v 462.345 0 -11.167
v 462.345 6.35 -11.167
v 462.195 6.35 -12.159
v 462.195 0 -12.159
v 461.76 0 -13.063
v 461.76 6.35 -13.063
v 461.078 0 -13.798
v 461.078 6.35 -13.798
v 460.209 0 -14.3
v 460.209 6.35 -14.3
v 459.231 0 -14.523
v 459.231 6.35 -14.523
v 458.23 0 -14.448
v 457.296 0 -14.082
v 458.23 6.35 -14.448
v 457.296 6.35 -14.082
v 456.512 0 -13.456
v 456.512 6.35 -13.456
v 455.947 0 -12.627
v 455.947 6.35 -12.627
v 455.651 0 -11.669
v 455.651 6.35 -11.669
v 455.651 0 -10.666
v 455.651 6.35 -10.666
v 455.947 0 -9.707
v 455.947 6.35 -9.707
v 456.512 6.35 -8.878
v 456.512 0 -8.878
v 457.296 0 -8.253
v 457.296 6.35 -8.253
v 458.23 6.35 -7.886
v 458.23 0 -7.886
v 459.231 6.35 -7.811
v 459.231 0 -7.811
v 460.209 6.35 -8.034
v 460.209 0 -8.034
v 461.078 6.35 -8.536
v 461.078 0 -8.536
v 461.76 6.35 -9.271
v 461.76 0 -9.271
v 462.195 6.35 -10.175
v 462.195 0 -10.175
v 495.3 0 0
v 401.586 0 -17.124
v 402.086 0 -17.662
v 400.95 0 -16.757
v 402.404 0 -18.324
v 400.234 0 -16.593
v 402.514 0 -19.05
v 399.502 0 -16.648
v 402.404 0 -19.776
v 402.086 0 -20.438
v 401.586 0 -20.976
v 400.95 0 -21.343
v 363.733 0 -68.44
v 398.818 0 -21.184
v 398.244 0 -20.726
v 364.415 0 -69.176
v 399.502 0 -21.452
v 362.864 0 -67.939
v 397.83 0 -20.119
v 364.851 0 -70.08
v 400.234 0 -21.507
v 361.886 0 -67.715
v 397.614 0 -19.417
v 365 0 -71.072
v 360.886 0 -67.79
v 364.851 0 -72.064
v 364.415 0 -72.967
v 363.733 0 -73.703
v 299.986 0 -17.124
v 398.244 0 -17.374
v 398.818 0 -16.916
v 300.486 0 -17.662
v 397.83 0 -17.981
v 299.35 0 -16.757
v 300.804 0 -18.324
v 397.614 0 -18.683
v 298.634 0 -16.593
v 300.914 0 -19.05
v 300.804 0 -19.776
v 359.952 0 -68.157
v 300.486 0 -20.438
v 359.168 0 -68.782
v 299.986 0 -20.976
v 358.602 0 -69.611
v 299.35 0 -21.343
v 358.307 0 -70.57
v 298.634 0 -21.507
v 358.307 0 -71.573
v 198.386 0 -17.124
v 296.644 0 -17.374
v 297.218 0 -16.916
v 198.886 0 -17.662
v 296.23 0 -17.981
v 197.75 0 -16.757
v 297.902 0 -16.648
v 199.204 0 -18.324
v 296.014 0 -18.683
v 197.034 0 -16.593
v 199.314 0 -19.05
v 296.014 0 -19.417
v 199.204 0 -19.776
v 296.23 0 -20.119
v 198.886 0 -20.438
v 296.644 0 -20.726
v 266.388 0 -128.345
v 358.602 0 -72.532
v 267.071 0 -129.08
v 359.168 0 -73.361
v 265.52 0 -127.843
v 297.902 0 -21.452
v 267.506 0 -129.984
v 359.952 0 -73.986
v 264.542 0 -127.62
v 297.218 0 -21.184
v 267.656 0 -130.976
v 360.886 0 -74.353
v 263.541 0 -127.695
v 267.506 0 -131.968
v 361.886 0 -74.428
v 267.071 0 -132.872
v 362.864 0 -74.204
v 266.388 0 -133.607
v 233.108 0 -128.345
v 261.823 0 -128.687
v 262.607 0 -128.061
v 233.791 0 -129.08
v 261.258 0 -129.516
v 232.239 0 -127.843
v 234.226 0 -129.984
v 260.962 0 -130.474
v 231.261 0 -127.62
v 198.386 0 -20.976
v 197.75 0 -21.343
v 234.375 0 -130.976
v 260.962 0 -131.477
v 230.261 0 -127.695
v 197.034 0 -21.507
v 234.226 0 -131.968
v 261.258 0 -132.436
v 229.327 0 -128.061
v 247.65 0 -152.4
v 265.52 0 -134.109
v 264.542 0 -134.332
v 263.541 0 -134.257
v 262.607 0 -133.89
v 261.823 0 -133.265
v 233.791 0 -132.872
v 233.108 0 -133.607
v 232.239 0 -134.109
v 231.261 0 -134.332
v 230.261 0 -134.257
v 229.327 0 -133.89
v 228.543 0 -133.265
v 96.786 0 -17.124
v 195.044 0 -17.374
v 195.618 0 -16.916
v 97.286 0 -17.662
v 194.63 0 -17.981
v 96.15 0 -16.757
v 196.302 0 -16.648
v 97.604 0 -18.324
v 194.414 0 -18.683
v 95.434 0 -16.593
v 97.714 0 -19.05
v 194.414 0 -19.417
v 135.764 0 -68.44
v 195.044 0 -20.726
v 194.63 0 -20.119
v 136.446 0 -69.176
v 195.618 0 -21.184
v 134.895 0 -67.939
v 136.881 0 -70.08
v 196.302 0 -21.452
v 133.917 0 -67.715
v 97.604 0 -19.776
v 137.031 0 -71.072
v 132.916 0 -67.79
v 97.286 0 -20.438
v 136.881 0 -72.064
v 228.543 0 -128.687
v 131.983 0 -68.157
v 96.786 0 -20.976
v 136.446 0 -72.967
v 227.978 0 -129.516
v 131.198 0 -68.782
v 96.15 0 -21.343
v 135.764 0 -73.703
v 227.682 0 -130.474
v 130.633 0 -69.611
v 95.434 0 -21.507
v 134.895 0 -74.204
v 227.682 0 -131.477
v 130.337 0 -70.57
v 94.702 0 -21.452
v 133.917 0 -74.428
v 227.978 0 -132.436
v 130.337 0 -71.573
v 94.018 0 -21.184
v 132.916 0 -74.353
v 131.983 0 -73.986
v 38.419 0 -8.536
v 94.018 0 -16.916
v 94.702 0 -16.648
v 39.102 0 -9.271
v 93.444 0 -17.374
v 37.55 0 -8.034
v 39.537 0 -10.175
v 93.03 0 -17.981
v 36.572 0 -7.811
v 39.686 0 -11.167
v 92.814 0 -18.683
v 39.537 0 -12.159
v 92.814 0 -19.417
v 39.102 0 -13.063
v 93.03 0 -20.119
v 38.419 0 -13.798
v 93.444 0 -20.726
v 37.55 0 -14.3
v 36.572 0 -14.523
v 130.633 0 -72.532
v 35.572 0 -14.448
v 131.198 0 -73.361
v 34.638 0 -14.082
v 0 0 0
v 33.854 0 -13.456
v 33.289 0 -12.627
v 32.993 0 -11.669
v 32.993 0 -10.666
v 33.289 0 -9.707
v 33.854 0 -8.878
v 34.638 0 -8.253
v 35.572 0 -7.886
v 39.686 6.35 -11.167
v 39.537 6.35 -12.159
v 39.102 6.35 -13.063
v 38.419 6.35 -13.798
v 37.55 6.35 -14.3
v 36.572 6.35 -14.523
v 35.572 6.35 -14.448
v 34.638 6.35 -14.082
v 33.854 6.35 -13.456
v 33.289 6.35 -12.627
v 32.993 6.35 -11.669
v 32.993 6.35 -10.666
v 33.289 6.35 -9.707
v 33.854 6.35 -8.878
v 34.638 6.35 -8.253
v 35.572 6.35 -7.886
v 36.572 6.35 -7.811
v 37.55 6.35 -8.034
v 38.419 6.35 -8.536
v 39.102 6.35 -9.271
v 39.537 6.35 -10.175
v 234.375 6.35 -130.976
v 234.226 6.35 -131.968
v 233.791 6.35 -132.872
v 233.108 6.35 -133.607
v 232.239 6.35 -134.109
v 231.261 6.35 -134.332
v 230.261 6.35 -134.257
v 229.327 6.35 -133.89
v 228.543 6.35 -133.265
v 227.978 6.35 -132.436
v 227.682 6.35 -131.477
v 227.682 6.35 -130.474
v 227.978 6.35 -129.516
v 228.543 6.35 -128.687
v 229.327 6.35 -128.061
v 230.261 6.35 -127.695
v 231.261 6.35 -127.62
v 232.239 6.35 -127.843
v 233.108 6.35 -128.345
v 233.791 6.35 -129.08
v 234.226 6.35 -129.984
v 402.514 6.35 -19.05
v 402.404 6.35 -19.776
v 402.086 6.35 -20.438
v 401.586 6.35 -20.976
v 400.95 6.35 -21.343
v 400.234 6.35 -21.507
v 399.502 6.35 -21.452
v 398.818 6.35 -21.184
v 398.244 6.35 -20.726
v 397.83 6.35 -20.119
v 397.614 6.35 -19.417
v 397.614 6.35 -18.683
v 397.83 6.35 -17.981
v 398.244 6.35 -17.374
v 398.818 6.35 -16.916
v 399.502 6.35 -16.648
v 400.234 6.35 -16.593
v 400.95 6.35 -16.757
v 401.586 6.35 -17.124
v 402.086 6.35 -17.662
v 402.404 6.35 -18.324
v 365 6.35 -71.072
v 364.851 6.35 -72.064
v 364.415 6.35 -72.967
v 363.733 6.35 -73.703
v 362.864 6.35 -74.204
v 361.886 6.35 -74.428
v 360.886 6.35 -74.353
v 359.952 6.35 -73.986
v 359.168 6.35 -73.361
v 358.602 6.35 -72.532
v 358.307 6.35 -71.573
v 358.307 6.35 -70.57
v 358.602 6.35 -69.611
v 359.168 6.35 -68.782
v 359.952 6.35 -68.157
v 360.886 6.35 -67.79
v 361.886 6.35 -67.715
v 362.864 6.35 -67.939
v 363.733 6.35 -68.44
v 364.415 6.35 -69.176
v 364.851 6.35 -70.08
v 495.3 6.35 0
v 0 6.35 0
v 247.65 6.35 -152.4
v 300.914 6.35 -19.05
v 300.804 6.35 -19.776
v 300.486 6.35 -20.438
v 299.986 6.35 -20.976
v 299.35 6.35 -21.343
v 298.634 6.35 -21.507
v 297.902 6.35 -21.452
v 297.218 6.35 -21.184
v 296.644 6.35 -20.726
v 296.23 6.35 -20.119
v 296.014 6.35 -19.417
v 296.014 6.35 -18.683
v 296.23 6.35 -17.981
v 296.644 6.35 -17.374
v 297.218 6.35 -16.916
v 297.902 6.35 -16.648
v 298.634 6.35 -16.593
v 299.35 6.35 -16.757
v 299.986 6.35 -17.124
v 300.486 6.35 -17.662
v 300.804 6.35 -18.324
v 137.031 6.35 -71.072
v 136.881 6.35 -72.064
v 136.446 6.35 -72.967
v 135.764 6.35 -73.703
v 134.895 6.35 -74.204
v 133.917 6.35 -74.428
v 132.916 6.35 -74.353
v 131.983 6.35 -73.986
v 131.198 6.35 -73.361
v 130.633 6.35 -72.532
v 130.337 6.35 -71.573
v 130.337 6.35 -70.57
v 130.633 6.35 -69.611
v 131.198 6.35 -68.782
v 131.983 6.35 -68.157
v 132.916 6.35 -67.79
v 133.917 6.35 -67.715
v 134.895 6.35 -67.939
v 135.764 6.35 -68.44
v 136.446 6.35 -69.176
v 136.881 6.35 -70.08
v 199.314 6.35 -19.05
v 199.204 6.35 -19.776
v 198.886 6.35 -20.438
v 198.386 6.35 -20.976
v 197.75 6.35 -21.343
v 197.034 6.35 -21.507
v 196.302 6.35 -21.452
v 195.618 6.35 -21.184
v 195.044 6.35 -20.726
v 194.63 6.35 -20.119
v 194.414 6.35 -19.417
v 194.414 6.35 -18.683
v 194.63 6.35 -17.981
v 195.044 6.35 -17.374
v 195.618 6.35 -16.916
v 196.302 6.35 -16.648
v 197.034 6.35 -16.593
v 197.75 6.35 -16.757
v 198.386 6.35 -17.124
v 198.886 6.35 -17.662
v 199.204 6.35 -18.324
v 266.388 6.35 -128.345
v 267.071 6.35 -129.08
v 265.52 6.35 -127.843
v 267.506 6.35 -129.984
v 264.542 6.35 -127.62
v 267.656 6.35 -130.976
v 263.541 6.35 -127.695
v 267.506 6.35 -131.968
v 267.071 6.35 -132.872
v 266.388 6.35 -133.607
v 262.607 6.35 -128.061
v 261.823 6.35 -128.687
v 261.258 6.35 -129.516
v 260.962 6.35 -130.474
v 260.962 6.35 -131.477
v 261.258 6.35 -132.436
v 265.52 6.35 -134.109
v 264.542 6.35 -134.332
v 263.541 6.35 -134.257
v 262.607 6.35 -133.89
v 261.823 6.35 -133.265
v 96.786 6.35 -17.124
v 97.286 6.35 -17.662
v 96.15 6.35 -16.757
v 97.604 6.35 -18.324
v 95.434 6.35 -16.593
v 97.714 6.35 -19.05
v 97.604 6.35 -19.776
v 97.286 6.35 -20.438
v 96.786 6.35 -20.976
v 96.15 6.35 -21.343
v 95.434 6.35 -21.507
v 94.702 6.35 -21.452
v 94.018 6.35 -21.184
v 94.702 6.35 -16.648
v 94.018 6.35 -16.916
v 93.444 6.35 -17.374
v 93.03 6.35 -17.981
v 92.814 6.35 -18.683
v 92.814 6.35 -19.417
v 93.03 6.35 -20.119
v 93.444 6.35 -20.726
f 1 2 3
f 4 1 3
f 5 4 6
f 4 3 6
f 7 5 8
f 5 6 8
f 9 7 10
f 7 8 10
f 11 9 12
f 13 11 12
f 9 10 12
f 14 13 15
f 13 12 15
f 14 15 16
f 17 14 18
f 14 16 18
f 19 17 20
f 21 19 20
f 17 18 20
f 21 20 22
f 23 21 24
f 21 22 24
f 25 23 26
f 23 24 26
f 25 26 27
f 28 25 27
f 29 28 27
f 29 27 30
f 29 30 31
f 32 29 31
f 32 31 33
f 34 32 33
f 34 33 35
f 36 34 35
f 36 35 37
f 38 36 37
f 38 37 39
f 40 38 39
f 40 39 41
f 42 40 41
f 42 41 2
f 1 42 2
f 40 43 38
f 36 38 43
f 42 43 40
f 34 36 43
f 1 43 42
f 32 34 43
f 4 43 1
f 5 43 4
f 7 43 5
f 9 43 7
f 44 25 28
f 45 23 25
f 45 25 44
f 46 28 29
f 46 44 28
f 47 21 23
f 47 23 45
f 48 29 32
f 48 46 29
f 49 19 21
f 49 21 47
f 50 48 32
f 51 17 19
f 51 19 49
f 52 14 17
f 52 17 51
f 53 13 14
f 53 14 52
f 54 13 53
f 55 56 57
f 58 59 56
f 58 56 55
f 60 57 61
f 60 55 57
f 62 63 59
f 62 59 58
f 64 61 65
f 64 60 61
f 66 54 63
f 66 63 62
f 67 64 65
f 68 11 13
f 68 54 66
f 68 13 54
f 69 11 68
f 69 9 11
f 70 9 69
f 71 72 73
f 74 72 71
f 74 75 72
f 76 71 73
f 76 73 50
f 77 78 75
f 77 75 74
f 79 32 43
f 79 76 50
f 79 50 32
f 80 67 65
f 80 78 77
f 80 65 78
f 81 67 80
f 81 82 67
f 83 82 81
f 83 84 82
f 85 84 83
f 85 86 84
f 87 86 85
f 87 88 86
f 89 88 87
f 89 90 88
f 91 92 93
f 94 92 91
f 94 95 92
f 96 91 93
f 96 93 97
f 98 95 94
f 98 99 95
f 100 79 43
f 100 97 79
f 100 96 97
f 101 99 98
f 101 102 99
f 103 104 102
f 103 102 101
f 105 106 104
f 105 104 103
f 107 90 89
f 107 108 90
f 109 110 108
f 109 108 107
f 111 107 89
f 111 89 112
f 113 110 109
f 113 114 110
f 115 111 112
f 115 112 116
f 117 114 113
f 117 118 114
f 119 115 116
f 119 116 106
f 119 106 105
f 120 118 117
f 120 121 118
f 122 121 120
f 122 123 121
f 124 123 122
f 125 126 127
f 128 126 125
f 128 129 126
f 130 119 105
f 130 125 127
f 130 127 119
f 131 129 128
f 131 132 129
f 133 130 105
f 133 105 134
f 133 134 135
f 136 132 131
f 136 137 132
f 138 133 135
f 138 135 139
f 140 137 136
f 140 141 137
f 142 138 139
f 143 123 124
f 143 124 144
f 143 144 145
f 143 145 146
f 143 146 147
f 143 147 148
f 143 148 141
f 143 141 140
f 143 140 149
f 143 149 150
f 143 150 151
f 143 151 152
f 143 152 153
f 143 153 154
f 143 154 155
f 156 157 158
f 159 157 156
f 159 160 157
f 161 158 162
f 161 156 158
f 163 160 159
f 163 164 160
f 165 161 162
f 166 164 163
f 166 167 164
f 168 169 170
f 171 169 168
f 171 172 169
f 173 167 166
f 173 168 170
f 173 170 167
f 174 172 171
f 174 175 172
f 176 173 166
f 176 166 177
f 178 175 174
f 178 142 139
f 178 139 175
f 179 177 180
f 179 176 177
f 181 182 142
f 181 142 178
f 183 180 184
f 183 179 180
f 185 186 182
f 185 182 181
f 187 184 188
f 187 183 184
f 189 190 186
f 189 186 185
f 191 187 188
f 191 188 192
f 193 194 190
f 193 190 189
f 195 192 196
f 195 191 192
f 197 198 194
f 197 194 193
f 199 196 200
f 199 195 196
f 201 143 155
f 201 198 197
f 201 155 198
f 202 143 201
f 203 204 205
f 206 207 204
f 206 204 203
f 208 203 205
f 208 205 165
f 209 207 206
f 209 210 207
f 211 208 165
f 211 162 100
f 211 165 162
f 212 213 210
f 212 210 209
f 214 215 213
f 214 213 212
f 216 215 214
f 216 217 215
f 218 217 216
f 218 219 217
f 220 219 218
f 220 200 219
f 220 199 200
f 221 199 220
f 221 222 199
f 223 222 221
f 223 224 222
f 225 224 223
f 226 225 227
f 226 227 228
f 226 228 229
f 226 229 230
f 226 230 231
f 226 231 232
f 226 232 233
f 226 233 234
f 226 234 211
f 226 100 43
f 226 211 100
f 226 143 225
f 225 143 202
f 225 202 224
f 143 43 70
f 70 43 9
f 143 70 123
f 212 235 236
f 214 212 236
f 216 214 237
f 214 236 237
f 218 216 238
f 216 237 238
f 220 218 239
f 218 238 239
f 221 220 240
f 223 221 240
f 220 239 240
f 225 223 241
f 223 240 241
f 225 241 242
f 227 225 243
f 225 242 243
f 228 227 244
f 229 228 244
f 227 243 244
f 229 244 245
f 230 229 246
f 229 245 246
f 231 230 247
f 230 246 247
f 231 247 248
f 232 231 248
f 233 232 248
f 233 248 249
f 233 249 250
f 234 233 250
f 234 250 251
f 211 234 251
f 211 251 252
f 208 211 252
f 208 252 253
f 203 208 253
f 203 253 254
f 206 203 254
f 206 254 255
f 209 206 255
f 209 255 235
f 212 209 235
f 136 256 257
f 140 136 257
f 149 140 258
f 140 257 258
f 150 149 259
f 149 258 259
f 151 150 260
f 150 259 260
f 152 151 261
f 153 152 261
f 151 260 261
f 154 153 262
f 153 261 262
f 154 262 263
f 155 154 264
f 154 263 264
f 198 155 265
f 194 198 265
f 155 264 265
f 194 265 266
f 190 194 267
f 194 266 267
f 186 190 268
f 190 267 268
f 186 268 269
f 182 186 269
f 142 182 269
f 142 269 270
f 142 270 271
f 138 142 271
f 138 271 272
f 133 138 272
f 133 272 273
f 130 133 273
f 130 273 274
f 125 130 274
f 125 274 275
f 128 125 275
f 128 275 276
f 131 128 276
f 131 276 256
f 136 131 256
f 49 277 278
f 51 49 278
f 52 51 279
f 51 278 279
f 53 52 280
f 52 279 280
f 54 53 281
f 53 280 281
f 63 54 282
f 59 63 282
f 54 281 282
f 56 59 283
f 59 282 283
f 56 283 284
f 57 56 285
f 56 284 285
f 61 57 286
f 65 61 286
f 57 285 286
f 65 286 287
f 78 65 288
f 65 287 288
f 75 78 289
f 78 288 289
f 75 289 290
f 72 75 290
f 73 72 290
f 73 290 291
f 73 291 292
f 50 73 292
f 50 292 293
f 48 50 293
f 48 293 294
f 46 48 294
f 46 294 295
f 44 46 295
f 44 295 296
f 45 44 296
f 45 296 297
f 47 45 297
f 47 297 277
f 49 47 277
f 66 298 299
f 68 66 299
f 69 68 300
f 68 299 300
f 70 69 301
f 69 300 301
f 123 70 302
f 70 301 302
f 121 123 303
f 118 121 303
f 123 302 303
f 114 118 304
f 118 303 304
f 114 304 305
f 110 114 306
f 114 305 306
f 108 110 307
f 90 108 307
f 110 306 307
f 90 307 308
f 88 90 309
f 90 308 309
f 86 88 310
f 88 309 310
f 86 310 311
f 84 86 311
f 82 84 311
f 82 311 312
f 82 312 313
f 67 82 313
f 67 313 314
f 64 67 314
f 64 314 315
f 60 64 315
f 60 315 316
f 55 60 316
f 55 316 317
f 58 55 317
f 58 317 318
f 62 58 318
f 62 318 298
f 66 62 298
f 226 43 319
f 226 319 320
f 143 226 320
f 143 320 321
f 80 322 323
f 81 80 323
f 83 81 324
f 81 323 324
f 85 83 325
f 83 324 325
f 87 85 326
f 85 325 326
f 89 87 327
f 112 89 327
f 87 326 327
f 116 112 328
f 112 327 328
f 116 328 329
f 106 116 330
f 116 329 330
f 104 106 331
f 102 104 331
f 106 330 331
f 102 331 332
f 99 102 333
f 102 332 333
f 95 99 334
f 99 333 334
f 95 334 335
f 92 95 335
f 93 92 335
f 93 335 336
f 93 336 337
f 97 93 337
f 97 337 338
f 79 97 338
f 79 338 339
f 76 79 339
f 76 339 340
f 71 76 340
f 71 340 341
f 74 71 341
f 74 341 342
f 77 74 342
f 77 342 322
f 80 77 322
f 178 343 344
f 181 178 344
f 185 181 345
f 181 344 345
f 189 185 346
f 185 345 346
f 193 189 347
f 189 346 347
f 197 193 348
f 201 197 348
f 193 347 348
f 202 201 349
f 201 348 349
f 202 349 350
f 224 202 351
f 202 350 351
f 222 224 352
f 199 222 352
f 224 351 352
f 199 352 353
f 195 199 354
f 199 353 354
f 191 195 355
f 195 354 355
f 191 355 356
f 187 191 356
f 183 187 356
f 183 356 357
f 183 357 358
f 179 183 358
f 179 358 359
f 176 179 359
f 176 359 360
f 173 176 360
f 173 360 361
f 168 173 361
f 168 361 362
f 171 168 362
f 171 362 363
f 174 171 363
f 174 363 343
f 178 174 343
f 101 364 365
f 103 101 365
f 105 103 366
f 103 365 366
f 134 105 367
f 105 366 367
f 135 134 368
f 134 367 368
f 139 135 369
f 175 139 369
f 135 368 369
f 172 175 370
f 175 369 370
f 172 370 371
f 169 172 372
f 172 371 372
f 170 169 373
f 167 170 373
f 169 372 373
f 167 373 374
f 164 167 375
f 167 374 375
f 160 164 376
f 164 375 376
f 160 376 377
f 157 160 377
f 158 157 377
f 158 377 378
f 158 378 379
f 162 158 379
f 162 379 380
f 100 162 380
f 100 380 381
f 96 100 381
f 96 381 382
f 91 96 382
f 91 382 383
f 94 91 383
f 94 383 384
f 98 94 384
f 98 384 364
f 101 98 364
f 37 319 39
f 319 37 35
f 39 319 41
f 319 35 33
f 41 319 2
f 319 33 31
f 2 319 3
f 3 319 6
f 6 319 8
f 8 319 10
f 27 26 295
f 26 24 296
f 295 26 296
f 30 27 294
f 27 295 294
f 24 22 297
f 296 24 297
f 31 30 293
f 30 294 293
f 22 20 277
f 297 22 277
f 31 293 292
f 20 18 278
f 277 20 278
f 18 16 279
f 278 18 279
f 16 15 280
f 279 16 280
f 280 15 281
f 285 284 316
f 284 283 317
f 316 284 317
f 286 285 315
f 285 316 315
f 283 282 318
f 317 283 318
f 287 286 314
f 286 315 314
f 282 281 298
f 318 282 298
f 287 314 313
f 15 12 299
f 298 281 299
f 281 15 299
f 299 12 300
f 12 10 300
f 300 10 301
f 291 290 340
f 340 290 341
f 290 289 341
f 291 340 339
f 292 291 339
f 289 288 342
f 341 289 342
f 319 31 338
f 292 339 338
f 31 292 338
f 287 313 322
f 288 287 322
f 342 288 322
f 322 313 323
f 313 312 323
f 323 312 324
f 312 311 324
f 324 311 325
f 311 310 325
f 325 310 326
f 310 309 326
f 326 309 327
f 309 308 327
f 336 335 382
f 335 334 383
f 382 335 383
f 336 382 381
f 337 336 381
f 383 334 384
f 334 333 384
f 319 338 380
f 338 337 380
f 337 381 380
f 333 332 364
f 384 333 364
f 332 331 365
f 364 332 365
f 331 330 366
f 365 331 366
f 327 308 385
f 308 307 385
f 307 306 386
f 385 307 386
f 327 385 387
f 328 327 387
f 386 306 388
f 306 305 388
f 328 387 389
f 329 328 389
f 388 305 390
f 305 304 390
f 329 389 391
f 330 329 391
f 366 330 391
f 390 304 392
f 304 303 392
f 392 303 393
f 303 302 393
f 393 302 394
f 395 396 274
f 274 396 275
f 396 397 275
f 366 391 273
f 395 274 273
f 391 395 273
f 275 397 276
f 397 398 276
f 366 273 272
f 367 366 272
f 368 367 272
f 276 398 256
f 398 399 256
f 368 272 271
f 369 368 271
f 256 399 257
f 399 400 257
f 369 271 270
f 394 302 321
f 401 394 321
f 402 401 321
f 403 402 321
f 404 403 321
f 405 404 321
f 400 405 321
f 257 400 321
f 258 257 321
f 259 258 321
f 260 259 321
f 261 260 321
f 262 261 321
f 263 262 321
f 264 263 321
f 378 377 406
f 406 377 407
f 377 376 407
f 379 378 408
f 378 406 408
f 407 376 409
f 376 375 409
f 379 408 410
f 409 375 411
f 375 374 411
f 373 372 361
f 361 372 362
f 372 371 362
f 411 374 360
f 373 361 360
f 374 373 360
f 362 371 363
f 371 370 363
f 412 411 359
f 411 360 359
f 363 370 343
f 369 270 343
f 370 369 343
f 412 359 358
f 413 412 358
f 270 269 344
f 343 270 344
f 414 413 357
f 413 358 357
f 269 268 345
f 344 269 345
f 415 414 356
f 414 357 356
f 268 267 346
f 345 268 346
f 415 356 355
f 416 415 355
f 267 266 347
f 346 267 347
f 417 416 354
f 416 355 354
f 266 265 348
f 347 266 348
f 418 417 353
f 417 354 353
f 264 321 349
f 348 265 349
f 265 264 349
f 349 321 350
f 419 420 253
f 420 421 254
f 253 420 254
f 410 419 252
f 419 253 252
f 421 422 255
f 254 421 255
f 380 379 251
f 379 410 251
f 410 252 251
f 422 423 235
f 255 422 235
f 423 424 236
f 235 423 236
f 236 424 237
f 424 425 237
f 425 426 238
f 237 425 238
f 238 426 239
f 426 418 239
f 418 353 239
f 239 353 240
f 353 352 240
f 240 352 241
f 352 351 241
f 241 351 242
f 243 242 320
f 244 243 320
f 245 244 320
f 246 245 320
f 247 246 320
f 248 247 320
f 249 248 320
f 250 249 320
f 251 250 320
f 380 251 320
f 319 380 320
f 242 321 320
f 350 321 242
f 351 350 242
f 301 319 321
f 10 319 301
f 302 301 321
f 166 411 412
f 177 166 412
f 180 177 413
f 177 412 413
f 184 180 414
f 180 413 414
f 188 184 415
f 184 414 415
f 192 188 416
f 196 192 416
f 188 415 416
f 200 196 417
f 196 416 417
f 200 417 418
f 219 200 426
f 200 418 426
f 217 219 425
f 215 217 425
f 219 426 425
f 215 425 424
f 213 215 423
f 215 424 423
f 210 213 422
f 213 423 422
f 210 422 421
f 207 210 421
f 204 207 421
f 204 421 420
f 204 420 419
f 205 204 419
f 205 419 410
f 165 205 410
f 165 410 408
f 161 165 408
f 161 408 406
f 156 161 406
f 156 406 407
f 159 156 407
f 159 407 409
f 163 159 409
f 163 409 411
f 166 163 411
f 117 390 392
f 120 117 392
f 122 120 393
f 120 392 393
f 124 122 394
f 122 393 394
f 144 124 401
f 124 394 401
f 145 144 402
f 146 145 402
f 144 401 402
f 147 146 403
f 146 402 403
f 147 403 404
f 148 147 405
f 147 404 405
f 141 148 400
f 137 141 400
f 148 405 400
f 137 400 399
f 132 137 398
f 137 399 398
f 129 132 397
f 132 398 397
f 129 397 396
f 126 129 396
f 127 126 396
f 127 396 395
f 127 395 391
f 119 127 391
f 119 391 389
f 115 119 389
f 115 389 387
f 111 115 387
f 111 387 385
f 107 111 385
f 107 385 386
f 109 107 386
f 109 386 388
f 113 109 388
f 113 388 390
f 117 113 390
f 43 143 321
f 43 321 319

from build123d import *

# Parameters (mm, degrees)
BOSS_EXTRUDE1_DEPTH = 6.35
SKETCH2_R           = 2.4638
CUT_EXTRUDE1_DEPTH  = 7.35
LPATTERN1_COUNT     = 4
LPATTERN1_PITCH     = 101.6
SKETCH3_R           = 3.3655
CUT_EXTRUDE2_DEPTH  = 7.35


with BuildPart() as part:
    # Sketch1 → Boss-Extrude1 (new body)
    with BuildSketch(Plane(origin=(0, 0, 0), x_dir=(1, 0, 0), z_dir=(0, 1, 0))):
        Polygon((0, 0), (247.65, 152.4), (495.3, 0), align=None)
    extrude(amount=BOSS_EXTRUDE1_DEPTH)

    # Sketch2 → Cut-Extrude1 (cut, through all)
    with BuildSketch(Plane(origin=(0, 6.35, 0), x_dir=(1, 0, 0), z_dir=(0, 1, 0))):
        with Locations((95.25, 19.05)):
            Circle(SKETCH2_R)
    cut_extrude1 = extrude(amount=-CUT_EXTRUDE1_DEPTH, mode=Mode.SUBTRACT)

    # LPattern1: Cut-Extrude1 ×4
    with Locations(*[(i * LPATTERN1_PITCH, 0, 0) for i in range(1, LPATTERN1_COUNT)]):
        add(cut_extrude1, mode=Mode.SUBTRACT)

    # Sketch3 → Cut-Extrude2 (cut, through all)
    with BuildSketch(Plane(origin=(0, 6.35, 0), x_dir=(1, 0, 0), z_dir=(0, 1, 0))):
        with Locations((231.009906735, 130.975879922)):
            Circle(SKETCH3_R)
        with Locations((133.665361136, 71.071544168)):
            Circle(SKETCH3_R)
        with Locations((36.320815536, 11.167208415)):
            Circle(SKETCH3_R)
        with Locations((264.290093265, 130.975879922)):
            Circle(SKETCH3_R)
        with Locations((361.634638864, 71.071544168)):
            Circle(SKETCH3_R)
        with Locations((458.979184464, 11.167208415)):
            Circle(SKETCH3_R)
    extrude(amount=-CUT_EXTRUDE2_DEPTH, mode=Mode.SUBTRACT)


solid = part.part
